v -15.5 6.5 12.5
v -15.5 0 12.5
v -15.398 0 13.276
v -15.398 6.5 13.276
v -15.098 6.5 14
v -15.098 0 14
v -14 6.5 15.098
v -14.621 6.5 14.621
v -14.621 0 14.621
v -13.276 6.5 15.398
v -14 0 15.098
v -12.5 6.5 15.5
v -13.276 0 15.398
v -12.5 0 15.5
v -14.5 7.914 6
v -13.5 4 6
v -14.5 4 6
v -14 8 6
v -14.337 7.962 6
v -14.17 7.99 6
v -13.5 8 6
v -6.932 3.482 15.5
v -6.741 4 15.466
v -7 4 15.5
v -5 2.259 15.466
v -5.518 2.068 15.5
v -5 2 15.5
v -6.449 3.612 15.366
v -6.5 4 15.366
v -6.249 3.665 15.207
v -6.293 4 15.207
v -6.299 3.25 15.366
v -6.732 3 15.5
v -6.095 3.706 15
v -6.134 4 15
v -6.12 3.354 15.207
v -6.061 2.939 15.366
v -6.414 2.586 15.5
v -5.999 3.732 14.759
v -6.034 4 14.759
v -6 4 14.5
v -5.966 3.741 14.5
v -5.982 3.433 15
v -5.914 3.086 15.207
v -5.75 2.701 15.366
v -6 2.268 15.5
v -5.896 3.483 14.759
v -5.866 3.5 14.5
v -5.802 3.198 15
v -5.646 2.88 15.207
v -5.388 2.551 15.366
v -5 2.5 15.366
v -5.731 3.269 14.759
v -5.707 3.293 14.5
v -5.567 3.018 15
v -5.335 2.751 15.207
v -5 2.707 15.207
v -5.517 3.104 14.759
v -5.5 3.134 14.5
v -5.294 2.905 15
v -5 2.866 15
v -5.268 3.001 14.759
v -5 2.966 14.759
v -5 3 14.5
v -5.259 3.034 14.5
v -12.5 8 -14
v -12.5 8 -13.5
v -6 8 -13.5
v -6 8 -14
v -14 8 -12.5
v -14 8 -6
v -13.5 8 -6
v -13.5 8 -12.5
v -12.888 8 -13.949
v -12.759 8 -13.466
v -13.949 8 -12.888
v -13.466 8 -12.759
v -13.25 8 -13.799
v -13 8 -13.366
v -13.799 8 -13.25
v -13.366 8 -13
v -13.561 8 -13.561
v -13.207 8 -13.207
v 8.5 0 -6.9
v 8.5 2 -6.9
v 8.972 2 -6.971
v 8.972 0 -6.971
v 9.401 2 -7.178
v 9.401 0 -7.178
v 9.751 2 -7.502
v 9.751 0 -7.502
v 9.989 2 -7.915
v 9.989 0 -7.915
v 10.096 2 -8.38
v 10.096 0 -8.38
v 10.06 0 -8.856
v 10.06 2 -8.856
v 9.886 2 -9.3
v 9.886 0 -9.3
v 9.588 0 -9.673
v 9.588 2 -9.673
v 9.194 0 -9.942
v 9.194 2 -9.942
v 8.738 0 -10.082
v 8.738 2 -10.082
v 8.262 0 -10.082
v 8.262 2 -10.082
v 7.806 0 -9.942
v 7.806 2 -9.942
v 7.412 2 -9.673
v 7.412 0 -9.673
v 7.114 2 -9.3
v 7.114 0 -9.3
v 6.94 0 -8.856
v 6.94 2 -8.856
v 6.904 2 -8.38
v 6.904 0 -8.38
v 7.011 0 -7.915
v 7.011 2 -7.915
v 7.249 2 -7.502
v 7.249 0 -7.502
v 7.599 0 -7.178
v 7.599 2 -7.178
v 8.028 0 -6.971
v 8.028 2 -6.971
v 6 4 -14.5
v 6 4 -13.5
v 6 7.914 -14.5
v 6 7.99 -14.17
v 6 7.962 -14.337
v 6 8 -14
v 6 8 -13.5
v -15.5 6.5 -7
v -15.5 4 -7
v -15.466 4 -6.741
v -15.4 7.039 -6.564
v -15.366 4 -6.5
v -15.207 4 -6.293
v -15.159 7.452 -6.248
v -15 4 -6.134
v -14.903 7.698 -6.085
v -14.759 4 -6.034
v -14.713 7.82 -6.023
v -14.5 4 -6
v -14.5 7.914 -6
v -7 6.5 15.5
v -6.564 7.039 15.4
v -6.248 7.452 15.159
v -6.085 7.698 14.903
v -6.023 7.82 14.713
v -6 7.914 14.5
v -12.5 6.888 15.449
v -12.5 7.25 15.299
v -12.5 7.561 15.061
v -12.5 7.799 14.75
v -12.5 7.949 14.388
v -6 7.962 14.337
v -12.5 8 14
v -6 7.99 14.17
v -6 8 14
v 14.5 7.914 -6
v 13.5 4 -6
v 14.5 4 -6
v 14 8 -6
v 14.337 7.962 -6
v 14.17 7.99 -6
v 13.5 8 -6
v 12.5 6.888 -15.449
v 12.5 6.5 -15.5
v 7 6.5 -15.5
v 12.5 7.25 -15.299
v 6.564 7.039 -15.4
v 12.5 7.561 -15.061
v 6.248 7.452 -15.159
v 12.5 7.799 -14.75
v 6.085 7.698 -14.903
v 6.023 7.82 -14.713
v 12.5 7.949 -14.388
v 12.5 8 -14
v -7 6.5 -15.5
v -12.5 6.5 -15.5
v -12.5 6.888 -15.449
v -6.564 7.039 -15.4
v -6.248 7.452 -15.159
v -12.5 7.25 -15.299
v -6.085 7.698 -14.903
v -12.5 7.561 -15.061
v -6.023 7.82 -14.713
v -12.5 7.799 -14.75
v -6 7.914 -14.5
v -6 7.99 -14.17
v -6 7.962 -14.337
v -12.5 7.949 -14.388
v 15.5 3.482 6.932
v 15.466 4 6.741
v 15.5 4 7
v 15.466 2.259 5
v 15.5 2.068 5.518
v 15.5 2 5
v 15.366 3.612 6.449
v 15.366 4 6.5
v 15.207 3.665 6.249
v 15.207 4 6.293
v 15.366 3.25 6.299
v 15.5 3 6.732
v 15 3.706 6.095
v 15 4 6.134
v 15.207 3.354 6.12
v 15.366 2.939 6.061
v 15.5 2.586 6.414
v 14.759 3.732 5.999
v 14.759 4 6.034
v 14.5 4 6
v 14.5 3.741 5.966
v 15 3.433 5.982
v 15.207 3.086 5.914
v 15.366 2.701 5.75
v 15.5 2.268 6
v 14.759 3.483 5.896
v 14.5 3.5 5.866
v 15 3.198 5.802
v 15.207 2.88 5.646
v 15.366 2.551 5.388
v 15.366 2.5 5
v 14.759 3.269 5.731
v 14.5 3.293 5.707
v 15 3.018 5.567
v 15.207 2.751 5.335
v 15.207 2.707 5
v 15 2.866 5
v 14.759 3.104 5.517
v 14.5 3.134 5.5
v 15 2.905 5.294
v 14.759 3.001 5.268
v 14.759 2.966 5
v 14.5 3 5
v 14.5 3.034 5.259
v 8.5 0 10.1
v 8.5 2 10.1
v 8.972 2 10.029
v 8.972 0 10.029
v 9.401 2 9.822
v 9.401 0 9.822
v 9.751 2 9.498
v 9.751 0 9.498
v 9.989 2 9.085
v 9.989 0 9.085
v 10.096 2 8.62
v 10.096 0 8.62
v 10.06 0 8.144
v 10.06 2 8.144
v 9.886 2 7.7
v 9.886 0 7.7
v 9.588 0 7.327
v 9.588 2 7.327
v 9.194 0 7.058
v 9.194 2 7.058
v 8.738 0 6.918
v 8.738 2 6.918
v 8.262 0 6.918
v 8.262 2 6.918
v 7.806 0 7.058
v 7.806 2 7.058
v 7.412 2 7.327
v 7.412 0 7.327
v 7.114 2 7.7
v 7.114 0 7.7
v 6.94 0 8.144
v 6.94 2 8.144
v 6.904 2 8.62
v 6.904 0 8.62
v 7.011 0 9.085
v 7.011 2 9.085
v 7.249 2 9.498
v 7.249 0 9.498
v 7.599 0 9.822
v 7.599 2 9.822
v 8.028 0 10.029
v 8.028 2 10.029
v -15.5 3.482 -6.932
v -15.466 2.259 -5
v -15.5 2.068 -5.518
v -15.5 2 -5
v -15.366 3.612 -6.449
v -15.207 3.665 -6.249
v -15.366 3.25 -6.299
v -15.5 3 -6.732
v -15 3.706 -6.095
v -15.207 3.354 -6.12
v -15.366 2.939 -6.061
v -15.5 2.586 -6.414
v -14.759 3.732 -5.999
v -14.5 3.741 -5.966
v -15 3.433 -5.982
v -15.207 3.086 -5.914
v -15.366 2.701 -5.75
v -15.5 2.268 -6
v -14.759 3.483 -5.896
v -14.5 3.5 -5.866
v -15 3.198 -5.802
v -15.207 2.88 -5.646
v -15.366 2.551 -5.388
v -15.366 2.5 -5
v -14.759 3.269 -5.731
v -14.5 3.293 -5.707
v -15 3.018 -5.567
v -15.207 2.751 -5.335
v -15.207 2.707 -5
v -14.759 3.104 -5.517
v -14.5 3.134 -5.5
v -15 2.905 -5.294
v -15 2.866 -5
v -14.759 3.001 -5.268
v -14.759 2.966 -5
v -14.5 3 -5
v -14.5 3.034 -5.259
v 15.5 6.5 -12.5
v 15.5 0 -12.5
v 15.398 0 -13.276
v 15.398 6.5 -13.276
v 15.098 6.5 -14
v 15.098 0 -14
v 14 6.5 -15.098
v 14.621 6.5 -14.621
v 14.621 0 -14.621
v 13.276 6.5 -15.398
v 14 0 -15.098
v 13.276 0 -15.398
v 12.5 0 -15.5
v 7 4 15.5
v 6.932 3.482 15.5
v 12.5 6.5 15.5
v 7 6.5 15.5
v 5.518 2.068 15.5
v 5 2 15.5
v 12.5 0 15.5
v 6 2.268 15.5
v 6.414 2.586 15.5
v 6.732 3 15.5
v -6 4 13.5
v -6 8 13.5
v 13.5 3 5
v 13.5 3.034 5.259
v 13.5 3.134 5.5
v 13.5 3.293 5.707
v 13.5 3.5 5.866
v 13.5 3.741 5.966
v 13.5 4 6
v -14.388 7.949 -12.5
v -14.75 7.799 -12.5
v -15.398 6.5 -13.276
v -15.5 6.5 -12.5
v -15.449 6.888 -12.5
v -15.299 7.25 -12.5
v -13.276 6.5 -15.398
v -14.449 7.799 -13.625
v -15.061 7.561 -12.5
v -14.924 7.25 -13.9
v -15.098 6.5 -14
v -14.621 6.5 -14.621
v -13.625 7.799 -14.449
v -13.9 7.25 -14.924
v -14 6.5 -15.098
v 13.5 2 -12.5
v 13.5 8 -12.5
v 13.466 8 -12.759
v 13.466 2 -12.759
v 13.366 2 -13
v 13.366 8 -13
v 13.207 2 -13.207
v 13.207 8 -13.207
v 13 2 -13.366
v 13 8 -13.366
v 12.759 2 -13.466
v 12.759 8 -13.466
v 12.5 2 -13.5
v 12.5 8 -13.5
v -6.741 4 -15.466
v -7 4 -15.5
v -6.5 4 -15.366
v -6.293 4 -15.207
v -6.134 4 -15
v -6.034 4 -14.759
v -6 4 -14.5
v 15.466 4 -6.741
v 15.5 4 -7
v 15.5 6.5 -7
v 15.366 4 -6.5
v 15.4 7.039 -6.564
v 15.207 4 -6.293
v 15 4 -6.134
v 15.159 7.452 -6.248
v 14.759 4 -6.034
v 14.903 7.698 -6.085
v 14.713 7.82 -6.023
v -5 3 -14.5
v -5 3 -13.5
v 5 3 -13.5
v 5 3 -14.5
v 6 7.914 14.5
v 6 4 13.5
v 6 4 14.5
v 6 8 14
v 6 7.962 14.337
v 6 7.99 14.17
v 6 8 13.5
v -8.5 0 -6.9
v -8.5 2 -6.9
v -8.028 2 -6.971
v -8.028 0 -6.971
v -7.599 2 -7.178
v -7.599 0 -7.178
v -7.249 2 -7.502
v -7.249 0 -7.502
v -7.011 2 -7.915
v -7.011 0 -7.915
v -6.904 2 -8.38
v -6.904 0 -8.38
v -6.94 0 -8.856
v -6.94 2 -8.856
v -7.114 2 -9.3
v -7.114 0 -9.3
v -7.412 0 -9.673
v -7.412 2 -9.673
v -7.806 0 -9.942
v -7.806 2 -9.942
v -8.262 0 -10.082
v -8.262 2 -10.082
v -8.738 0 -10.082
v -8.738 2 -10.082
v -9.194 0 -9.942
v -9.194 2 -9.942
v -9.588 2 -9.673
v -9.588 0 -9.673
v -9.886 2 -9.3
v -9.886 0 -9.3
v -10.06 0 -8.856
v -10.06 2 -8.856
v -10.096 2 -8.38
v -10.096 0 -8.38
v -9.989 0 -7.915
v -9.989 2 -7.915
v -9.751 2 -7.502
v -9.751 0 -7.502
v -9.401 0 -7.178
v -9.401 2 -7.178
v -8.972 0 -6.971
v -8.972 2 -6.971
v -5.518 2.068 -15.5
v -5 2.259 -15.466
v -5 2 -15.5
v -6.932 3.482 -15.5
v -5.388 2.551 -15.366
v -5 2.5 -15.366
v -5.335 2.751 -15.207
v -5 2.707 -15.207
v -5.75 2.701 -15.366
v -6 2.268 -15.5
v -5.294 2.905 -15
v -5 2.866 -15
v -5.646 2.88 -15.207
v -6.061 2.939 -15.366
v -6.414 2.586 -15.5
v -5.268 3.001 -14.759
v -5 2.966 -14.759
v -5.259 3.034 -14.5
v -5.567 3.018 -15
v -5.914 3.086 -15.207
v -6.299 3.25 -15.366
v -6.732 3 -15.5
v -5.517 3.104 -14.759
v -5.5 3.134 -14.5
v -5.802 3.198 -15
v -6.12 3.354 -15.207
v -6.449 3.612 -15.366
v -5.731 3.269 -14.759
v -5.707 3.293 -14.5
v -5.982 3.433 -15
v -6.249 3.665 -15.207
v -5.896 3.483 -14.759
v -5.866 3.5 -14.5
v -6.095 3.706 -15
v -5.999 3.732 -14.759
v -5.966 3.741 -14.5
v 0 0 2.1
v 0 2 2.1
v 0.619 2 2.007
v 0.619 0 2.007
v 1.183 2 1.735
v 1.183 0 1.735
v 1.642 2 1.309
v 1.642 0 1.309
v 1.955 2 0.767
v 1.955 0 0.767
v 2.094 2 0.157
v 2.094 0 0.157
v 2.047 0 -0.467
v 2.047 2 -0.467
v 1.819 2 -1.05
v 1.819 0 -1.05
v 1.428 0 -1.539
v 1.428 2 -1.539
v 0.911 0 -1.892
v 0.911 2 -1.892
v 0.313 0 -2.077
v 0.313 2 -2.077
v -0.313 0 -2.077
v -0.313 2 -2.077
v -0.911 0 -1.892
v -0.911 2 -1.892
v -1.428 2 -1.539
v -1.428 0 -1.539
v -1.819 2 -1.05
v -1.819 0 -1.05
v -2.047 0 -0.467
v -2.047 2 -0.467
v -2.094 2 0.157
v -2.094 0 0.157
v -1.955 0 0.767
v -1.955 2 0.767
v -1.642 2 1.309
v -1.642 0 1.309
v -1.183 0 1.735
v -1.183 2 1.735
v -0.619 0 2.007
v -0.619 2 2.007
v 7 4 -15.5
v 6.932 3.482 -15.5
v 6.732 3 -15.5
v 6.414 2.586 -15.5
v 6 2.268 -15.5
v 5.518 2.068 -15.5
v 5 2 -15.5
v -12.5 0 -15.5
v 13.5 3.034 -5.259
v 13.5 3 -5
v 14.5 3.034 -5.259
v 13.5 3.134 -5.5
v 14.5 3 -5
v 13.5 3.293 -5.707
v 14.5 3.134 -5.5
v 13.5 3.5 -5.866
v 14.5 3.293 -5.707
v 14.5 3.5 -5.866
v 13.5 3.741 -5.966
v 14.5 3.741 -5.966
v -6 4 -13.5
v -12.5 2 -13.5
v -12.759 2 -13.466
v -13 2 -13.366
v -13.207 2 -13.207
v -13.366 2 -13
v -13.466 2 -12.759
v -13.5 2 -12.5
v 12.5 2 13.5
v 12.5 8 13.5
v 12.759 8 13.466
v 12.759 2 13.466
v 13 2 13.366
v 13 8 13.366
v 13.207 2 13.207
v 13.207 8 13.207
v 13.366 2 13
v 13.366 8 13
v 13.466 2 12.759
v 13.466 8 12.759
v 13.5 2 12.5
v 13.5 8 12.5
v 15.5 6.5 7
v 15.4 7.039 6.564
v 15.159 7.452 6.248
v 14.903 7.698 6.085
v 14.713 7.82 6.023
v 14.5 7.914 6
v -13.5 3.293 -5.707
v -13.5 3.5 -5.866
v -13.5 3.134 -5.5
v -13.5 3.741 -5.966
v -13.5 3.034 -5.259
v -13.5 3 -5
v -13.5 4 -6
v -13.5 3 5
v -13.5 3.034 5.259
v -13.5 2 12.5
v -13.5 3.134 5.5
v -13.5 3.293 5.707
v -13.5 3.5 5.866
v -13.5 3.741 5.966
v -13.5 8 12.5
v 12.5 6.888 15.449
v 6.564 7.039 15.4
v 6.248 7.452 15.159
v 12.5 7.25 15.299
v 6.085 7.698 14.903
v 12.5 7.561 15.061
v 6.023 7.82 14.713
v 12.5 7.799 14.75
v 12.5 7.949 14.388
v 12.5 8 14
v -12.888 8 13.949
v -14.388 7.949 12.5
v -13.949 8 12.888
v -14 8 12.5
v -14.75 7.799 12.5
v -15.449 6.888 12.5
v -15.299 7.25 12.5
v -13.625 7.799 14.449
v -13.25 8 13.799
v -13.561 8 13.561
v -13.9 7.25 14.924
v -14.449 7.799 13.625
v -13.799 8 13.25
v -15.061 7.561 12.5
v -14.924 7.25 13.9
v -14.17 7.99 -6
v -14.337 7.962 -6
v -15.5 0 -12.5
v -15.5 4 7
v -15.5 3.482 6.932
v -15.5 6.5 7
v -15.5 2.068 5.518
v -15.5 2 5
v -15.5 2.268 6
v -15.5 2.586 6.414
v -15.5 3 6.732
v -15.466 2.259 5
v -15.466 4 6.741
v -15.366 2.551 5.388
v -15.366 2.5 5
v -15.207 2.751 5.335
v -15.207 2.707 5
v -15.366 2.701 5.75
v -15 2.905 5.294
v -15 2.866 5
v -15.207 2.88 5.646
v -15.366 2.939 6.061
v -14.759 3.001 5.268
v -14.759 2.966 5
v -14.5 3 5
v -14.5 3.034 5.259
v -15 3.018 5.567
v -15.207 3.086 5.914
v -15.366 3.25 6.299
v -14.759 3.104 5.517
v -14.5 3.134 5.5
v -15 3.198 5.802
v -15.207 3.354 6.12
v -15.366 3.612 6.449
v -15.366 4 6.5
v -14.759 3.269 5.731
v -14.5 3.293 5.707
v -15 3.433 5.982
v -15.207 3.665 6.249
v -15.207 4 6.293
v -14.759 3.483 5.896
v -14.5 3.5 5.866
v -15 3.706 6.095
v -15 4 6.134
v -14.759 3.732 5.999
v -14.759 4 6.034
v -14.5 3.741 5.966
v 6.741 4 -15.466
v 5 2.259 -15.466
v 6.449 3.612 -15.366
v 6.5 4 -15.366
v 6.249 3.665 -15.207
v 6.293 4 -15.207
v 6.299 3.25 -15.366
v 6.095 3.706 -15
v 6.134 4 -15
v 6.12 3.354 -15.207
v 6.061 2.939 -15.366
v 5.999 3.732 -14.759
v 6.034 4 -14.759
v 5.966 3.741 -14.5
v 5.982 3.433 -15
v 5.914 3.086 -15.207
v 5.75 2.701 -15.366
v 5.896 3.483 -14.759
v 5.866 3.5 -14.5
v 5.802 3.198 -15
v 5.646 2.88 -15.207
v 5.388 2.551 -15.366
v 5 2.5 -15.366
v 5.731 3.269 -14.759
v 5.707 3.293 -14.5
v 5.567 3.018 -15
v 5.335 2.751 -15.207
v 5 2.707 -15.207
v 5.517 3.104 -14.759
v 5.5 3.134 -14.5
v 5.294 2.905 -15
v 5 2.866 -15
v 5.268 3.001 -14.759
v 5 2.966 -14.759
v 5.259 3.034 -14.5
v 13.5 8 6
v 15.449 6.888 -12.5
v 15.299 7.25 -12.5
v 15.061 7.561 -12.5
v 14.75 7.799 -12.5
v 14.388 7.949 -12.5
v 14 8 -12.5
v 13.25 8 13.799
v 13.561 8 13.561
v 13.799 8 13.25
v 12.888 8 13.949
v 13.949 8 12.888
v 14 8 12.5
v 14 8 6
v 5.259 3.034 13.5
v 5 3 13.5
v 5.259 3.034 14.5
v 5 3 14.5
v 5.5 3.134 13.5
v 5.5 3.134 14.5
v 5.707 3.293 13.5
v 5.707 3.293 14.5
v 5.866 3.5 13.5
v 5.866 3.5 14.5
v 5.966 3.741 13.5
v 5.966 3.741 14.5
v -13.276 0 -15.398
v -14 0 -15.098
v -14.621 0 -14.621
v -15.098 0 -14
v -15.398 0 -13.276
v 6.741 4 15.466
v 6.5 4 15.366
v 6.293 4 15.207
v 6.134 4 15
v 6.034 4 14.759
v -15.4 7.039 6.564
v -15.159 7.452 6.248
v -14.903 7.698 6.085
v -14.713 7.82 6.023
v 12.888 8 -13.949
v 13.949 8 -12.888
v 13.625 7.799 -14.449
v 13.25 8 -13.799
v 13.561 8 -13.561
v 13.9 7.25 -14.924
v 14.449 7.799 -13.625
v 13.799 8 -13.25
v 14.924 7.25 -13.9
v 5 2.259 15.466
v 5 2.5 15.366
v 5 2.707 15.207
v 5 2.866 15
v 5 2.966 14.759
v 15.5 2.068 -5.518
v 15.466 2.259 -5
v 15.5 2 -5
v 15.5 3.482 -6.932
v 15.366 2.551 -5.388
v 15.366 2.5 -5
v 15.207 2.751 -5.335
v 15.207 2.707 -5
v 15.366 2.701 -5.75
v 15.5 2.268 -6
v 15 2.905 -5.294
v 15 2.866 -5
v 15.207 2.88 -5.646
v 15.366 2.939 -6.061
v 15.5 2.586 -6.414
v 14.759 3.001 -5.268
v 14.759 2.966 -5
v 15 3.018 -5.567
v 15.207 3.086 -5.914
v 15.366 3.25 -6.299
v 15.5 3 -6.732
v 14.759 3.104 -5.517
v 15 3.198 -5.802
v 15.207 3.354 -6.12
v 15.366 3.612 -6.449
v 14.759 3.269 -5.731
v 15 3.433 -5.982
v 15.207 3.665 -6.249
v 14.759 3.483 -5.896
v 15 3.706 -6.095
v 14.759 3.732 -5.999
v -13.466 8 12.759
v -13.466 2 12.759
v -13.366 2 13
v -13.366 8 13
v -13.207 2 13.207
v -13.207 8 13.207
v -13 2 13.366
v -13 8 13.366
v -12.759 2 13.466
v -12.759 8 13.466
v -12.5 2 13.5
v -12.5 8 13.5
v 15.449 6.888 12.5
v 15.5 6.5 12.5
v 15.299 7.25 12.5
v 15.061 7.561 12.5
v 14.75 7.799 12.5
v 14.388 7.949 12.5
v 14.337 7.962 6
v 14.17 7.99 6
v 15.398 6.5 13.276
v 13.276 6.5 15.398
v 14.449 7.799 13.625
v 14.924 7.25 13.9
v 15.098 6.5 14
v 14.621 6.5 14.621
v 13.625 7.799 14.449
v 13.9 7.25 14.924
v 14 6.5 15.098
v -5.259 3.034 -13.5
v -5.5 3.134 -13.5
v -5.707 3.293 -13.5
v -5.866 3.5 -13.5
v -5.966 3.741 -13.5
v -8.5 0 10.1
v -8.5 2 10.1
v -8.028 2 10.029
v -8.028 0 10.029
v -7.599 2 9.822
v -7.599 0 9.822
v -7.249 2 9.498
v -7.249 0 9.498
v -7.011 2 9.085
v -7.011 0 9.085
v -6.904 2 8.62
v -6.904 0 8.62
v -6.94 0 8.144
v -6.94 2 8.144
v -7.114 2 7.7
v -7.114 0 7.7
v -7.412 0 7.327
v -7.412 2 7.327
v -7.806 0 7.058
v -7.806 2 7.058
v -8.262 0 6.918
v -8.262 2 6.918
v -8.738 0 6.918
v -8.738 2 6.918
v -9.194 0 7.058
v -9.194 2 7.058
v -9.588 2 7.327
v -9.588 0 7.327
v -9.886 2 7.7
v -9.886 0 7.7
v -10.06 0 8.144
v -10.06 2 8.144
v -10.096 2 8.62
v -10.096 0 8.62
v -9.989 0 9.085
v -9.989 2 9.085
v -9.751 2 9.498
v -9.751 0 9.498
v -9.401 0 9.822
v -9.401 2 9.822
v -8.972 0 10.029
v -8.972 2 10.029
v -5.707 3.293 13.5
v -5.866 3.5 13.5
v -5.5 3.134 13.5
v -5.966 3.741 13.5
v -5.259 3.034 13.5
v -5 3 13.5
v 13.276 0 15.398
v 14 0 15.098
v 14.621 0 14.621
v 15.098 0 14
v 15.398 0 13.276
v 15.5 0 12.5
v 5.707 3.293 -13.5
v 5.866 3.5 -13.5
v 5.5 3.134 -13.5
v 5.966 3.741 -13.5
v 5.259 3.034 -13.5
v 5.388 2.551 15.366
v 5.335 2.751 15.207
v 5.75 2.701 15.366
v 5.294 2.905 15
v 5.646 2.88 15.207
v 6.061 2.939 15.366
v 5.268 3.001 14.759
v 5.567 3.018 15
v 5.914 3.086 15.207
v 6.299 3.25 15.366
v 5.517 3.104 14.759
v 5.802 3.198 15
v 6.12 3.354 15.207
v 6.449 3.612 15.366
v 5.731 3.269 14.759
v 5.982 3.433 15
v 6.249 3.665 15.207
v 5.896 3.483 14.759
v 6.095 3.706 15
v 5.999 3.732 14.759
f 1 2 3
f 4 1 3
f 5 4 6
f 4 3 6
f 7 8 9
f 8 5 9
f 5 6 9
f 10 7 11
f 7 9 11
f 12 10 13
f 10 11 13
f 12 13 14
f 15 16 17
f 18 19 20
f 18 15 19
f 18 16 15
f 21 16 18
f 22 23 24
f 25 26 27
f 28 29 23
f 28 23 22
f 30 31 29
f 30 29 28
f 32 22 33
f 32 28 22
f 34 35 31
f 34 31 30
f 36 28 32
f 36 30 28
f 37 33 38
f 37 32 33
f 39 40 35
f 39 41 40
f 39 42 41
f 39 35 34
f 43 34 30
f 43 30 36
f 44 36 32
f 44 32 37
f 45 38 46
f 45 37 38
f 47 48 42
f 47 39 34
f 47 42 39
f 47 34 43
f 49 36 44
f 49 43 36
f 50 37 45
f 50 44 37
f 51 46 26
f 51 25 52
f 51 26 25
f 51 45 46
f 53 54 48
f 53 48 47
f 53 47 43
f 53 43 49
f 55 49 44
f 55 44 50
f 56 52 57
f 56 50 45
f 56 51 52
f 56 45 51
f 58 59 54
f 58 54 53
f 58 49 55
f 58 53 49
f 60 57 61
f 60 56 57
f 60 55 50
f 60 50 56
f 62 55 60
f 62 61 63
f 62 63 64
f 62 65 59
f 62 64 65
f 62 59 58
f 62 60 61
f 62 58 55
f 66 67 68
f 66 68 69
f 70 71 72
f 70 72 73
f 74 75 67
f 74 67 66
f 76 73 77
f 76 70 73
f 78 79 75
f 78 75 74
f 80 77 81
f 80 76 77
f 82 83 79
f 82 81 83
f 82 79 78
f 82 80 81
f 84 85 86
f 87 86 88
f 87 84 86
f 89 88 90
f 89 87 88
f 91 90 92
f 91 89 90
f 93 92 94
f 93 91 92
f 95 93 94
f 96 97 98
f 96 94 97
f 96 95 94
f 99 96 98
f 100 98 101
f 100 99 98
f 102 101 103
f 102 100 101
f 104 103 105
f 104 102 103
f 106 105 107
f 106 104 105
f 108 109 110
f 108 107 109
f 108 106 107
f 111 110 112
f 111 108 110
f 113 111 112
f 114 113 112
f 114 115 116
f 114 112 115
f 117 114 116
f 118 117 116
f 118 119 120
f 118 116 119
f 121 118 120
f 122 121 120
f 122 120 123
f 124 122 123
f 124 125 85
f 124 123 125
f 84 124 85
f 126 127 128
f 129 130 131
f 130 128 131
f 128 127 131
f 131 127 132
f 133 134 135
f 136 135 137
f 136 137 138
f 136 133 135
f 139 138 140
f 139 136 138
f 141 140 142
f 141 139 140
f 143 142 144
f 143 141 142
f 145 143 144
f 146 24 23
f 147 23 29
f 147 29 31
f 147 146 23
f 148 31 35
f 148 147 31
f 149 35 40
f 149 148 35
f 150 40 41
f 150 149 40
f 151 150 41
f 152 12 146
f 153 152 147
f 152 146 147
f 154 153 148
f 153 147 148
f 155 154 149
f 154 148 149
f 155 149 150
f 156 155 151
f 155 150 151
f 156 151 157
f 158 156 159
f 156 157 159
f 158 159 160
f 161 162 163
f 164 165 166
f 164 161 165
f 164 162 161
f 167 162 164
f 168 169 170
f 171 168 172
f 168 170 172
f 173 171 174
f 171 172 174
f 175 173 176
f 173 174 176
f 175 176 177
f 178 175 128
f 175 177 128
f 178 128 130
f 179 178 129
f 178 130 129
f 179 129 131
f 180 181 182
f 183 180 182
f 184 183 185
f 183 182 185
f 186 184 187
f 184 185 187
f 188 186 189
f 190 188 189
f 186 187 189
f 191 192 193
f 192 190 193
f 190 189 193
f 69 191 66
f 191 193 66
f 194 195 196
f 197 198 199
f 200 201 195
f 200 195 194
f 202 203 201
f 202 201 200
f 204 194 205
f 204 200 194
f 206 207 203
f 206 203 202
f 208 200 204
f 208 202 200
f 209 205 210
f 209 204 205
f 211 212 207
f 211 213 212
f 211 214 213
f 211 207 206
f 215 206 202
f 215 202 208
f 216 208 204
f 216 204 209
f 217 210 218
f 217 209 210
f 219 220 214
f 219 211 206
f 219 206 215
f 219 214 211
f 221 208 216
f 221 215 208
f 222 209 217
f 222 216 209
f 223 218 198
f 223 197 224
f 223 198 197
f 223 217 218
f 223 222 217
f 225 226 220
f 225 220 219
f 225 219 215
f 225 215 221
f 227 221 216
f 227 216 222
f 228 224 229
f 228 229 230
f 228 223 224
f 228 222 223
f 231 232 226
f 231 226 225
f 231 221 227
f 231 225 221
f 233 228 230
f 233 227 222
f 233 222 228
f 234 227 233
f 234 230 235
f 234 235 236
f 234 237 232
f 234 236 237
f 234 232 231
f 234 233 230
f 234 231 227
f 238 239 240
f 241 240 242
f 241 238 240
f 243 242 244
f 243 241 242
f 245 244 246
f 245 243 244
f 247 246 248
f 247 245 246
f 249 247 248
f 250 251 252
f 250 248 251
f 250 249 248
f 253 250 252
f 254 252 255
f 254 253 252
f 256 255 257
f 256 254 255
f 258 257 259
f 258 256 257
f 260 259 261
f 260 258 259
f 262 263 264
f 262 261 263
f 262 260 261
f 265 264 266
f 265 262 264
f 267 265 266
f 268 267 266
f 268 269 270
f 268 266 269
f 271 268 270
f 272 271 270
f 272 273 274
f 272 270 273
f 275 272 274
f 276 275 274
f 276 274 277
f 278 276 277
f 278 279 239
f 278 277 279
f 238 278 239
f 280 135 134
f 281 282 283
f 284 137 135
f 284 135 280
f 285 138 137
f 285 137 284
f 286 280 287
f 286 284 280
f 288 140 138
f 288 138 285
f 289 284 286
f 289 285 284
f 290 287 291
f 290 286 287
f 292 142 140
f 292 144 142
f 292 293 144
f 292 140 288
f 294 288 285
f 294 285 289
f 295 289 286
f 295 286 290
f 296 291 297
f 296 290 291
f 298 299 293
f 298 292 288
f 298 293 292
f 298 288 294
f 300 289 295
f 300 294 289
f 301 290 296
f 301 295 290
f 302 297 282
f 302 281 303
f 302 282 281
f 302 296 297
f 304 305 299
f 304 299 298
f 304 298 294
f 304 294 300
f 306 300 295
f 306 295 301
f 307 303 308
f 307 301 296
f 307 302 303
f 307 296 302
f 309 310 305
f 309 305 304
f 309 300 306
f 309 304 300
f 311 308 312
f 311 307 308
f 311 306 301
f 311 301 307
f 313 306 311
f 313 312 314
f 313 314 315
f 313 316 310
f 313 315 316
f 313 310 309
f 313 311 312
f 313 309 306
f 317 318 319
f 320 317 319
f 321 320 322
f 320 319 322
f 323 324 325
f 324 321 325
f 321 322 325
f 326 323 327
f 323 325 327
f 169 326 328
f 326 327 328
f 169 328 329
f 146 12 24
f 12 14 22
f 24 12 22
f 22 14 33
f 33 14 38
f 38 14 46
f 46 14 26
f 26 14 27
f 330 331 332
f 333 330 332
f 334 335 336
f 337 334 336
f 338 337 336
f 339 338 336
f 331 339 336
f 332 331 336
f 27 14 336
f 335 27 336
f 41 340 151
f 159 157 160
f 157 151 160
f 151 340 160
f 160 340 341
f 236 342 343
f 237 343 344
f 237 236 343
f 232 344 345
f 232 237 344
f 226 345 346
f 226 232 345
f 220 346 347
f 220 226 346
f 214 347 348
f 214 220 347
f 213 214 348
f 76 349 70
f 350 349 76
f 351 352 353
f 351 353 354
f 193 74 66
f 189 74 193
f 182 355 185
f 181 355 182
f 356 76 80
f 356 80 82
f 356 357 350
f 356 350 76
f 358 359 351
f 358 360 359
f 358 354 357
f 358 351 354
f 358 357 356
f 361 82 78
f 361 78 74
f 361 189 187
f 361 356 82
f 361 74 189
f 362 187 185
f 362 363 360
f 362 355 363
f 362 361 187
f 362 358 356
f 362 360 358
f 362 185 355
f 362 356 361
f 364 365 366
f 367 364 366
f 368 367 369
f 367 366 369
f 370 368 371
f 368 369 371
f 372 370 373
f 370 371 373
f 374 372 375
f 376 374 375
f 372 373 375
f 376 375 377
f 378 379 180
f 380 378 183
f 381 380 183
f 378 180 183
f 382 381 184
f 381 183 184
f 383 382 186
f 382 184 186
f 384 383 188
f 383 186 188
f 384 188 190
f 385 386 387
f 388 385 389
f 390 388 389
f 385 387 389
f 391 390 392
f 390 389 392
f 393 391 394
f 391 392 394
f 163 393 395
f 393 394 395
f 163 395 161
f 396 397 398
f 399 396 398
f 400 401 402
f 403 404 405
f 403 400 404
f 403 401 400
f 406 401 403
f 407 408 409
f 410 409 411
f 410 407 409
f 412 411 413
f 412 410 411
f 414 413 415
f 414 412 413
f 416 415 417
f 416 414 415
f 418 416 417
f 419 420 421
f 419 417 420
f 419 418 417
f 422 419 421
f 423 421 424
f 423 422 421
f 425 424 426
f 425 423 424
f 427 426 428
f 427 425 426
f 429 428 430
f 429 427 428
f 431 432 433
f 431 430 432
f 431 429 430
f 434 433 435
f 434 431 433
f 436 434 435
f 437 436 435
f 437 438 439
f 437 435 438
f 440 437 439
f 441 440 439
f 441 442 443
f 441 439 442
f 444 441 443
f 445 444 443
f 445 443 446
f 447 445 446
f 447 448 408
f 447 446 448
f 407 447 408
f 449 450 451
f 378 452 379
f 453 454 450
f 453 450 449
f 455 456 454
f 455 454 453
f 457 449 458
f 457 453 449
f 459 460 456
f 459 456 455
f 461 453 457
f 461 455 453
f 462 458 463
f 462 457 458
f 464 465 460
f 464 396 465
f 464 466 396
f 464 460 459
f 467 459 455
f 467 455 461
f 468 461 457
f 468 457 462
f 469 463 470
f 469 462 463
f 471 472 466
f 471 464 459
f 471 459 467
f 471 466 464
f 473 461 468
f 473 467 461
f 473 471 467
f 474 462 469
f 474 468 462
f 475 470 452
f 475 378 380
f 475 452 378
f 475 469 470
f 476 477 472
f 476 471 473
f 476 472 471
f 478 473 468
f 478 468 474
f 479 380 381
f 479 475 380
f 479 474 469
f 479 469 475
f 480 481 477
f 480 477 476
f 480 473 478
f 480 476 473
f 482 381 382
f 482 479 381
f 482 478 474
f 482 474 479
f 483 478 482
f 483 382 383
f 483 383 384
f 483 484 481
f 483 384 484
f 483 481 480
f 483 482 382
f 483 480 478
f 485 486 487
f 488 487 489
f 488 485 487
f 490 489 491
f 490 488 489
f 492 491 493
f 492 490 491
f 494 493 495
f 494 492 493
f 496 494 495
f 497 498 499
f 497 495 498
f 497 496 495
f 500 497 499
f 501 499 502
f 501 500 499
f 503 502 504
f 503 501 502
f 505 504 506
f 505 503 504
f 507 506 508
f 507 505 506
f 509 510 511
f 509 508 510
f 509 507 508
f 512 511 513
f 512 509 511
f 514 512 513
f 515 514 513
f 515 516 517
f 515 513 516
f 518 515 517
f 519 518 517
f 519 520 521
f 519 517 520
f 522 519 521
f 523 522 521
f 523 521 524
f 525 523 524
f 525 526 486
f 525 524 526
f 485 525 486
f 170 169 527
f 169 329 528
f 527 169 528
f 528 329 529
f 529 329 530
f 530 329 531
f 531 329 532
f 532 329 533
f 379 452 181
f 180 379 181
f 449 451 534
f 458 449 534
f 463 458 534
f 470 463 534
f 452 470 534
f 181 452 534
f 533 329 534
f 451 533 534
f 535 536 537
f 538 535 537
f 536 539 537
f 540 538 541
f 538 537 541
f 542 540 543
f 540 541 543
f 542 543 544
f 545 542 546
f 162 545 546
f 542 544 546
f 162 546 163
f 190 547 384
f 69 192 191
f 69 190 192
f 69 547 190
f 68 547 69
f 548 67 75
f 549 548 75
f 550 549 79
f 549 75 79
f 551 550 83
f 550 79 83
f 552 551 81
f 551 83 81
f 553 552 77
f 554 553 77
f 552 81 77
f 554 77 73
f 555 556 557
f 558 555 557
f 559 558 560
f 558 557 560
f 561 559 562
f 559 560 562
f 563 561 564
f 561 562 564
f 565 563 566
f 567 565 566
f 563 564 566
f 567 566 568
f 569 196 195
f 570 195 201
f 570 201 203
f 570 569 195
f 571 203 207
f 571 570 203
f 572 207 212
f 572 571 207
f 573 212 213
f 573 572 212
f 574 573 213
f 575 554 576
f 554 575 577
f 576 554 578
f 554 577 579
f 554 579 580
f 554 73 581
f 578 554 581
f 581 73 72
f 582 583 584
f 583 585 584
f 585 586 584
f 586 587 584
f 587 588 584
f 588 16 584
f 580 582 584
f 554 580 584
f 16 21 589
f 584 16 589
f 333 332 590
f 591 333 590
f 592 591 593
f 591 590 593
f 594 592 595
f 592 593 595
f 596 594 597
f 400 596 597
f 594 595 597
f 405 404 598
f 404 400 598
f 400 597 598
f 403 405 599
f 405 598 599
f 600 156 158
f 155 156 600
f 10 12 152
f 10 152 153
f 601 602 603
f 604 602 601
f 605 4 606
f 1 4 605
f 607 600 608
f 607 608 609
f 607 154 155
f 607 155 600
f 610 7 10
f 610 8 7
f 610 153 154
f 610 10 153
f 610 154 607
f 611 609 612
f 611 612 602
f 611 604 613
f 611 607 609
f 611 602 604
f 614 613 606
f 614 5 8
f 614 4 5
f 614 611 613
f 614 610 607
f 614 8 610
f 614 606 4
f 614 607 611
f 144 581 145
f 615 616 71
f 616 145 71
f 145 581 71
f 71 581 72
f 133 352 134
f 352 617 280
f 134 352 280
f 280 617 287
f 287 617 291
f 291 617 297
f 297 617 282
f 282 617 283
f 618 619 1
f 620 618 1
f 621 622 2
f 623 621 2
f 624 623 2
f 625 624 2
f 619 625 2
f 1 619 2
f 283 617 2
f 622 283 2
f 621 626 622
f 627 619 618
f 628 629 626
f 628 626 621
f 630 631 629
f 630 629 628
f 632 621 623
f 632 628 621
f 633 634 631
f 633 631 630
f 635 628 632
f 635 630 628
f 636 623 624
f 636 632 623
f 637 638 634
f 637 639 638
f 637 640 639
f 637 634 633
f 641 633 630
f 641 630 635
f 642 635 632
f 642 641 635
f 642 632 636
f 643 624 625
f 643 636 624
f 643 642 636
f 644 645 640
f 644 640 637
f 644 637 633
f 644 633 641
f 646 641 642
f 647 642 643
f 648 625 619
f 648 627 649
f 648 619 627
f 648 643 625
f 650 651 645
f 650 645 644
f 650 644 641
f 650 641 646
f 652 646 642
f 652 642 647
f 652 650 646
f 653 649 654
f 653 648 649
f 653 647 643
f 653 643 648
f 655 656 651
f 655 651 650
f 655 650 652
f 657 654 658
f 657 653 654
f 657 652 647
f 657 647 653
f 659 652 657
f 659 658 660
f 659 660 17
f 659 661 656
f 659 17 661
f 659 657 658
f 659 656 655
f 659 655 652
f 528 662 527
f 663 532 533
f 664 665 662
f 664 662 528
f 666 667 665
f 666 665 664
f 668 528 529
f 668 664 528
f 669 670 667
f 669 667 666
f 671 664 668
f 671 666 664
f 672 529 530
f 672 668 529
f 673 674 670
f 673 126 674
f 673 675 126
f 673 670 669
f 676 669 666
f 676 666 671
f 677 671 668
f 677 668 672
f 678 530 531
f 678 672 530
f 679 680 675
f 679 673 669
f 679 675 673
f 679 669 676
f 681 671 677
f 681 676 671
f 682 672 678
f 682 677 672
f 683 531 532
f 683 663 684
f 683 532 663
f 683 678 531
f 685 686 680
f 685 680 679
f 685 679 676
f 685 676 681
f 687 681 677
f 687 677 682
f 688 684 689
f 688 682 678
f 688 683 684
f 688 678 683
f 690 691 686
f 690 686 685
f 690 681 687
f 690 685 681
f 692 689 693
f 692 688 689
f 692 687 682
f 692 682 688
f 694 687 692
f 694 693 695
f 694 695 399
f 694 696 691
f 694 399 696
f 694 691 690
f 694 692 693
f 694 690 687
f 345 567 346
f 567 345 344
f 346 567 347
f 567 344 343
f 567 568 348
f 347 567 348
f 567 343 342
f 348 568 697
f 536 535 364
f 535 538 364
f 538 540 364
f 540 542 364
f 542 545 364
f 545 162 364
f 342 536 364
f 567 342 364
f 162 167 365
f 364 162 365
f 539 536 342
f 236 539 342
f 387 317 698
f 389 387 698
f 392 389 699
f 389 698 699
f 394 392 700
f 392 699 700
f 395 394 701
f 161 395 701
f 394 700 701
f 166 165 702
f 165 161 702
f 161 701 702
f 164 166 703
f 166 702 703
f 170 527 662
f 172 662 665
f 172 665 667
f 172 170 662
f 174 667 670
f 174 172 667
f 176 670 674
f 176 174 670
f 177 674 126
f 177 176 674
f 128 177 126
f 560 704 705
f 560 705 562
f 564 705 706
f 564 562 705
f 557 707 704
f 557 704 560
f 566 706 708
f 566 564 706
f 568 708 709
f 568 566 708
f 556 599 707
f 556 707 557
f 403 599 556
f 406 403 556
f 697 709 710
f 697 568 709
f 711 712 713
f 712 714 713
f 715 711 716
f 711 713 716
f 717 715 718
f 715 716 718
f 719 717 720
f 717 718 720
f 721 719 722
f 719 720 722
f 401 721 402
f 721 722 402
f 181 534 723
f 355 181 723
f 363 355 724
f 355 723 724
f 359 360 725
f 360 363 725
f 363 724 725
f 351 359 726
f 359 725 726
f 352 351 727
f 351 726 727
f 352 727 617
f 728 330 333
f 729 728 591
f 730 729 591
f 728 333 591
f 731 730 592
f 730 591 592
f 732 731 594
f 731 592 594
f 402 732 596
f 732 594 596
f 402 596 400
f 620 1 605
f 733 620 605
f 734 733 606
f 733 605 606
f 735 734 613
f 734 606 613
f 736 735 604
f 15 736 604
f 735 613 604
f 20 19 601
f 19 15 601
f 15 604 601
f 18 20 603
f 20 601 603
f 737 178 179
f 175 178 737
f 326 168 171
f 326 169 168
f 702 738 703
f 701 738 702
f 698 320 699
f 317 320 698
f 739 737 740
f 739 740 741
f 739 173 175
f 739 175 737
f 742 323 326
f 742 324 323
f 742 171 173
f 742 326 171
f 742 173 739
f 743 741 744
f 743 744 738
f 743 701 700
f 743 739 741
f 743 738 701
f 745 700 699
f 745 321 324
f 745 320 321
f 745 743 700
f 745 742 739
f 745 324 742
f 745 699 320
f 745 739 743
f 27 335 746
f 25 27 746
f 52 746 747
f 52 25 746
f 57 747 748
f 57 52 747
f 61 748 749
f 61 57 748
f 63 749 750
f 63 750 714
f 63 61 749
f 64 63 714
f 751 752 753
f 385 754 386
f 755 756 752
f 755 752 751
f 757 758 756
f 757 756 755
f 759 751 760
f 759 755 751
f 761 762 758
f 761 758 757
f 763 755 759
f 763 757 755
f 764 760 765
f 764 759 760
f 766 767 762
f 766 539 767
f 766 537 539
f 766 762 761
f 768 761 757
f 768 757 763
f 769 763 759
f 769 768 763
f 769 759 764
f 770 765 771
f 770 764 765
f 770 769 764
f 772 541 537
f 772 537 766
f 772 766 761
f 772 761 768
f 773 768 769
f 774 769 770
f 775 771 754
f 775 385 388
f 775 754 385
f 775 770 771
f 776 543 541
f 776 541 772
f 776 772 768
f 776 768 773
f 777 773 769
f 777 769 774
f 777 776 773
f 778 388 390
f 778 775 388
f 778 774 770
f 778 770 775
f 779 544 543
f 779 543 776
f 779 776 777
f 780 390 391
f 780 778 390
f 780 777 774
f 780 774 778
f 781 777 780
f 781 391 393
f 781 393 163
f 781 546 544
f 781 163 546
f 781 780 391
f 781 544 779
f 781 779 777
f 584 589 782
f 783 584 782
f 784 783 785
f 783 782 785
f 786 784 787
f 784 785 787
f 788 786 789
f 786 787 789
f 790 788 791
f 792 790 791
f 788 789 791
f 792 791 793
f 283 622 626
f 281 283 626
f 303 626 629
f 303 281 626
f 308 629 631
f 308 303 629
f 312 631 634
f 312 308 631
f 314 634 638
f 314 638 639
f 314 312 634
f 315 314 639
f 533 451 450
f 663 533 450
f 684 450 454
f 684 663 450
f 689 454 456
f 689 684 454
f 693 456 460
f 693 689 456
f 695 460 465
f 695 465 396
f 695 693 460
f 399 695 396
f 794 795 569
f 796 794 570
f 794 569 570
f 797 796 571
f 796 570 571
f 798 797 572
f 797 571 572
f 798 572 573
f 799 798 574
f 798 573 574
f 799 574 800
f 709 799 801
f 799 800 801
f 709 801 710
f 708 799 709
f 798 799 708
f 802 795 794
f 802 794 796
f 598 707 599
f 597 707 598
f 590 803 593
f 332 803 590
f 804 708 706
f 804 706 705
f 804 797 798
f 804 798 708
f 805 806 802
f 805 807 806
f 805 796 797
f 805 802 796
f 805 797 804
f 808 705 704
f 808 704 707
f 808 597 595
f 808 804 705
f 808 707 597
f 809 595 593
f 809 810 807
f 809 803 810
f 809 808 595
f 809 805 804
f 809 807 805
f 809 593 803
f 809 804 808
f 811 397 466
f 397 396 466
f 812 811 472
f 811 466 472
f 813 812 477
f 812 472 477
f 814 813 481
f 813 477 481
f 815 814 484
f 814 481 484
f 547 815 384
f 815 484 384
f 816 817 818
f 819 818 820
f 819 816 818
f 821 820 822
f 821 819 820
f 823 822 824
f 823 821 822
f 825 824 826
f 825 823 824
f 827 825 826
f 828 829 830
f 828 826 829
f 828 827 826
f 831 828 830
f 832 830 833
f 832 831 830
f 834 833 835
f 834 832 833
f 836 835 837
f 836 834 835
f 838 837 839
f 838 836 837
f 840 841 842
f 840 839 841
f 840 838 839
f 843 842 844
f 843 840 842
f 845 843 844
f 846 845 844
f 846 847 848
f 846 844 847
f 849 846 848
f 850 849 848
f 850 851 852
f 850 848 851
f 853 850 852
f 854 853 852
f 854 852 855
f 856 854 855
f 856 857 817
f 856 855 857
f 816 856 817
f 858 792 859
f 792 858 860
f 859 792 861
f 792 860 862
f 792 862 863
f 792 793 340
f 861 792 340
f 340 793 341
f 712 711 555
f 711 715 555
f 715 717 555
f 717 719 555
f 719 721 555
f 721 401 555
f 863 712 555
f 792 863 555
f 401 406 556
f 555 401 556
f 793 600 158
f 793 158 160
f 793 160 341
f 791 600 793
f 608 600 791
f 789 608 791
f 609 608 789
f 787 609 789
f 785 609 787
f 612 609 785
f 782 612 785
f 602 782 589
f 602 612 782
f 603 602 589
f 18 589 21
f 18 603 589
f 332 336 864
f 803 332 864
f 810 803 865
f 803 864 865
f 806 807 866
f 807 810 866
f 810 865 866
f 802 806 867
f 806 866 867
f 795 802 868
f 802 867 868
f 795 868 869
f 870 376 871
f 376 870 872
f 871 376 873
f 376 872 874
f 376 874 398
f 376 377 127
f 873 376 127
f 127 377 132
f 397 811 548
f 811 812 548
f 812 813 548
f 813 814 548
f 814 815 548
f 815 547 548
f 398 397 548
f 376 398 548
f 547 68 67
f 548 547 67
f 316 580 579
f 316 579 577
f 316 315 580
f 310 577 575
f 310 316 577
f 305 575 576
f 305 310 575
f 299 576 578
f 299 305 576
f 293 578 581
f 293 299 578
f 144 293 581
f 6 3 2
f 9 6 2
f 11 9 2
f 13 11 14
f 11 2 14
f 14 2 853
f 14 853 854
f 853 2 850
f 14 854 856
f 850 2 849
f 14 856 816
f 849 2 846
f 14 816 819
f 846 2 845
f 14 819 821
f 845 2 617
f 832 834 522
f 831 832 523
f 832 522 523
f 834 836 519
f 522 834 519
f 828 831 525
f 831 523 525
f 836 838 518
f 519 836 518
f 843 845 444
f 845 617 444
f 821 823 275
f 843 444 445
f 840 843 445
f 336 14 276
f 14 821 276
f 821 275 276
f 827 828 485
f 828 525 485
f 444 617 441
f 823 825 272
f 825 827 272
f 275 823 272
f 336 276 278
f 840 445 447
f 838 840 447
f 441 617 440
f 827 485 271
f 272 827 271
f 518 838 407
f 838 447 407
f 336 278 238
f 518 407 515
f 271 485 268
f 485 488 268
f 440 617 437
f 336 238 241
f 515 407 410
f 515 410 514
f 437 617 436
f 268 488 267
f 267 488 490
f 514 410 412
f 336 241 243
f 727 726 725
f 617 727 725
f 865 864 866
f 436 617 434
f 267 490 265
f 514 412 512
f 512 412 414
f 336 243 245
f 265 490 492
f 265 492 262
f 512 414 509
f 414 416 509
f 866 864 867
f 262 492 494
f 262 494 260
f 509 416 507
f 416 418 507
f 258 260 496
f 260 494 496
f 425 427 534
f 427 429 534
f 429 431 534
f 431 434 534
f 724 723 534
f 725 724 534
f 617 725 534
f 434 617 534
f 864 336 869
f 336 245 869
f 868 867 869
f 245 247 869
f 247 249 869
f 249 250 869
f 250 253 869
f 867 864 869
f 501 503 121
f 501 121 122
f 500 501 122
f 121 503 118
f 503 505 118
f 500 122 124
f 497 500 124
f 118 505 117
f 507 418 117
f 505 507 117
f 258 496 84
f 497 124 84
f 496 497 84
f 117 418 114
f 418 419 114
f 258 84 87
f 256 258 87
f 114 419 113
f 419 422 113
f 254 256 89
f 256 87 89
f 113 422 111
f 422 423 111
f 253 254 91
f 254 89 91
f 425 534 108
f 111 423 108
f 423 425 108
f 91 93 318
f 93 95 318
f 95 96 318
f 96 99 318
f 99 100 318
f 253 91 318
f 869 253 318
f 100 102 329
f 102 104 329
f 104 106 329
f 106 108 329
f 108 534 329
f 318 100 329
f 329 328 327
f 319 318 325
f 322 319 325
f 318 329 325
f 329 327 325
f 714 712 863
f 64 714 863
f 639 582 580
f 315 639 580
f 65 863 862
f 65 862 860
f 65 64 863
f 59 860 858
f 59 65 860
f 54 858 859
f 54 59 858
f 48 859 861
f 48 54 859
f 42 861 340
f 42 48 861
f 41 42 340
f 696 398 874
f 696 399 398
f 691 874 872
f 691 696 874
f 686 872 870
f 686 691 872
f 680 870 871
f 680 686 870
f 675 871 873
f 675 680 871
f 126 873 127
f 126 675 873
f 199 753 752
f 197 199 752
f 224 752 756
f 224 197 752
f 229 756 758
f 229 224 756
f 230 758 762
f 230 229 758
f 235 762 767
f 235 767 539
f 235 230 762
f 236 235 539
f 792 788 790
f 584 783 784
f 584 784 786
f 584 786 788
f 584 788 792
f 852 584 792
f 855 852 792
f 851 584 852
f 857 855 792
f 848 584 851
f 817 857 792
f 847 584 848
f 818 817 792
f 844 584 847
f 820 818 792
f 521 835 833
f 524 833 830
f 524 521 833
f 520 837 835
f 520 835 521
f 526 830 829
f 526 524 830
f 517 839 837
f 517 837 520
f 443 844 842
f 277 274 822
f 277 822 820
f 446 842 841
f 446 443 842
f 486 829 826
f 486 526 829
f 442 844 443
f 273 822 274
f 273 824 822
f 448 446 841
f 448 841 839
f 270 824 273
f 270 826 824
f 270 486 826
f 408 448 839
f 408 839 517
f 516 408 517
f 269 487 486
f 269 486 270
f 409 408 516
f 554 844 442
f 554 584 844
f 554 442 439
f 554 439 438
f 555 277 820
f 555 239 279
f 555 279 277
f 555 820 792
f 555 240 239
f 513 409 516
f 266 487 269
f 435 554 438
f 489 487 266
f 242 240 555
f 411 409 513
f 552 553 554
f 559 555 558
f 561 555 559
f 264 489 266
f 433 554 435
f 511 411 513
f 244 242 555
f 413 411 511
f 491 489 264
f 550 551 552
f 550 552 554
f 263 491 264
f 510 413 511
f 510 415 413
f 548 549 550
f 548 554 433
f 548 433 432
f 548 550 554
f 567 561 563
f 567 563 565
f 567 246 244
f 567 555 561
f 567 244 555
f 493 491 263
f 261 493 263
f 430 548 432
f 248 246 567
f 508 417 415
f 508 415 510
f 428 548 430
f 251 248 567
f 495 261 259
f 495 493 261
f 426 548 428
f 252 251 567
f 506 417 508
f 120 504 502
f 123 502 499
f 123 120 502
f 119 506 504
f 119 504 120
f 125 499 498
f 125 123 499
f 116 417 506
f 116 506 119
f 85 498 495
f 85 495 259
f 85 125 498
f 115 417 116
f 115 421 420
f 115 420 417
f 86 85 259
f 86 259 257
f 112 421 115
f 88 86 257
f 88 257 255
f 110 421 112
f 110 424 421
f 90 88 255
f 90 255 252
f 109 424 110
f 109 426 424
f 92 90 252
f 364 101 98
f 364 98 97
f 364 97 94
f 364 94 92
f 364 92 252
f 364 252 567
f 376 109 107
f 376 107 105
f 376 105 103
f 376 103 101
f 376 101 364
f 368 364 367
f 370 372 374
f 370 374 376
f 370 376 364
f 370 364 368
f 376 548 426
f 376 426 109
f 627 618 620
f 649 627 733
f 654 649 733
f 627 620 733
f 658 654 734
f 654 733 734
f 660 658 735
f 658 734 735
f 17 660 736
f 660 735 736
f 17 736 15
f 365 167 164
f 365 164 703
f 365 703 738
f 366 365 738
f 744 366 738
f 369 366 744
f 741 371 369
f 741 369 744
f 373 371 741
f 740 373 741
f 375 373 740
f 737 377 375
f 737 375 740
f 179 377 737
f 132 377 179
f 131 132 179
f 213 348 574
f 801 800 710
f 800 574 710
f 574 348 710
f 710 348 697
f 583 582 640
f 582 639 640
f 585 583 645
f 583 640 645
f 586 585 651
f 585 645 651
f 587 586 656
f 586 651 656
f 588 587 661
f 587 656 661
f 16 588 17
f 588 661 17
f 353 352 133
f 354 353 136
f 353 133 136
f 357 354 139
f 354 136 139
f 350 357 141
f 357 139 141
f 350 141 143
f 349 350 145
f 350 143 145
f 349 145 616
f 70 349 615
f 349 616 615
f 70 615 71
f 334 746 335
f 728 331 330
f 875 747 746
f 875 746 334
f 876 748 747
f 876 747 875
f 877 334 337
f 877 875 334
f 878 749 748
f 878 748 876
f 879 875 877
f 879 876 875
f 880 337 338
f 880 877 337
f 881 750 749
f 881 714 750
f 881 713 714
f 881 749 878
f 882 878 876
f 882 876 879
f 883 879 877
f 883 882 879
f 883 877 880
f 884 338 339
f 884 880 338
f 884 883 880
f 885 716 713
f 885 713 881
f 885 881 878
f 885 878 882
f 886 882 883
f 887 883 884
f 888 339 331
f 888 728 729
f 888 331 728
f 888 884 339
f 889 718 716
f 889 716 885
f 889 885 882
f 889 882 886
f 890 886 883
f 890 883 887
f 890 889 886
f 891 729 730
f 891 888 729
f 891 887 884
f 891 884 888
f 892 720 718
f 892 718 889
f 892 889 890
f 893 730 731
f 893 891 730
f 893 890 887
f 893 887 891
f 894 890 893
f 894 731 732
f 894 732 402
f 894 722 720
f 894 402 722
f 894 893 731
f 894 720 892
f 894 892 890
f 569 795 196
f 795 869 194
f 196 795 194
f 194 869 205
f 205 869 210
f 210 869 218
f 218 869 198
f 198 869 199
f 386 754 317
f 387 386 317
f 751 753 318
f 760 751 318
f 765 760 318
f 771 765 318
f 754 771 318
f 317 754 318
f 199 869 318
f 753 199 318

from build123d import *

# Parameters (mm, degrees)
SKETCH1_R               = 2.1
SKETCH1_R_2             = 1.6
BOSS_EXTRUDE1_DEPTH     = 10
CUT_EXTRUDE1_DEPTH      = 8
SKETCH3_W               = 12
SKETCH3_H               = 6
CUT_EXTRUDE2_DEPTH      = 35.369317712
CIRPATTERN1_COUNT       = 4
FILLET1_R               = 1
CUT_EXTRUDE3_DEPTH      = 25.093567606
CUT_EXTRUDE3_DEPTH_BACK = 25.093567606
SKETCH4_W               = 64.927368138
SKETCH4_H               = 2
FILLET2_R               = 1.5


# Some blends are built 0.0001 mm under size
with BuildPart() as part:
    # Sketch1 → Boss-Extrude1 (new body)
    with BuildSketch(Plane(origin=(0, 0, 0), x_dir=(1, 0, 0), z_dir=(0, 1, 0))):
        with BuildLine():
            Line((-12.5, -15.5), (12.5, -15.5))
            ThreePointArc((12.5, -15.5), (14.621320344, -14.621320344), (15.5, -12.5))
            Line((15.5, -12.5), (15.5, 12.5))
            ThreePointArc((15.5, 12.5), (14.621320344, 14.621320344), (12.5, 15.5))
            Line((12.5, 15.5), (-12.5, 15.5))
            ThreePointArc((-12.5, 15.5), (-14.621320344, 14.621320344), (-15.5, 12.5))
            Line((-15.5, 12.5), (-15.5, -12.5))
            ThreePointArc((-15.5, -12.5), (-14.621320344, -14.621320344), (-12.5, -15.5))
        make_face()
        with Locations(Location((0, 0, 0), (0, 0, 270))):
            Circle(SKETCH1_R, mode=Mode.SUBTRACT)
        with Locations(Location((-8.5, 8.5, 0), (0, 0, 270))):
            Circle(SKETCH1_R_2, mode=Mode.SUBTRACT)
        with Locations(Location((8.5, 8.5, 0), (0, 0, 270))):
            Circle(SKETCH1_R_2, mode=Mode.SUBTRACT)
        with Locations(Location((8.5, -8.5, 0), (0, 0, 270))):
            Circle(SKETCH1_R_2, mode=Mode.SUBTRACT)
        with Locations(Location((-8.5, -8.5, 0), (0, 0, 270))):
            Circle(SKETCH1_R_2, mode=Mode.SUBTRACT)
    extrude(amount=BOSS_EXTRUDE1_DEPTH)

    # Sketch2 → Cut-Extrude1 (cut)
    with BuildSketch(Plane(origin=(0, 10, 0), x_dir=(1, 0, 0), z_dir=(0, 1, 0))):
        with BuildLine():
            Line((-12.5, -13.5), (12.5, -13.5))
            ThreePointArc((12.5, -13.5), (13.207106781, -13.207106781), (13.5, -12.5))
            Line((13.5, -12.5), (13.5, 12.5))
            ThreePointArc((13.5, 12.5), (13.207106781, 13.207106781), (12.5, 13.5))
            Line((12.5, 13.5), (-12.5, 13.5))
            ThreePointArc((-12.5, 13.5), (-13.207106781, 13.207106781), (-13.5, 12.5))
            Line((-13.5, 12.5), (-13.5, -12.5))
            ThreePointArc((-13.5, -12.5), (-13.207106781, -13.207106781), (-12.5, -13.5))
        make_face()
    extrude(amount=-CUT_EXTRUDE1_DEPTH, mode=Mode.SUBTRACT)

    # Sketch3 → Cut-Extrude2 (cut, through all)
    with BuildSketch(Plane.XY.offset(-13.5)):
        with Locations((0, 6)):
            Rectangle(SKETCH3_W, SKETCH3_H)
    cut_extrude2 = extrude(amount=-CUT_EXTRUDE2_DEPTH, mode=Mode.SUBTRACT)

    # CirPattern1: Cut-Extrude2 ×4 about axis
    cirpattern1_axis = Axis((0, 0, 0), (0, 1, 0))
    for i in range(1, CIRPATTERN1_COUNT):
        add(cut_extrude2.rotate(cirpattern1_axis, i * 360 / CIRPATTERN1_COUNT), mode=Mode.SUBTRACT)

    # Fillet1
    fillet1_edges = [part.edges().sort_by_distance(p)[0] for p in [
        (-15.5, 6, 6),
        (-14.5, 3, 6),
        (-15.5, 9, 0),
        (-14.5, 9, 6),
        (-15.5, 6, -6),
        (-14.5, 9, -6),
        (-15.5, 3, 0),
        (-14.5, 3, -6),
        (6, 6, 15.5),
        (6, 3, 14.5),
        (0, 9, 15.5),
        (6, 9, 14.5),
        (-6, 6, 15.5),
        (-6, 9, 14.5),
        (0, 3, 15.5),
        (-6, 3, 14.5),
        (15.5, 6, -6),
        (14.5, 3, -6),
        (15.5, 9, 0),
        (14.5, 9, -6),
        (15.5, 6, 6),
        (14.5, 9, 6),
        (15.5, 3, 0),
        (14.5, 3, 6),
        (-6, 6, -15.5),
        (-6, 3, -14.5),
        (0, 9, -15.5),
        (-6, 9, -14.5),
        (6, 6, -15.5),
        (6, 9, -14.5),
        (0, 3, -15.5),
        (6, 3, -14.5),
    ]]
    fillet(fillet1_edges, radius=FILLET1_R - 0.0001)  # a hair under: the kernel refuses the full size

    # Sketch4 → Cut-Extrude3 (cut, two sides: drawn at the far end of the back side and taken through both)
    with BuildSketch(Plane(origin=(0, 0, 0), x_dir=(0, 0, -1), z_dir=(1, 0, 0)).offset(-CUT_EXTRUDE3_DEPTH_BACK)):
        with Locations((2.454919732, 9)):
            Rectangle(SKETCH4_W, SKETCH4_H)
    extrude(amount=CUT_EXTRUDE3_DEPTH + CUT_EXTRUDE3_DEPTH_BACK, mode=Mode.SUBTRACT)

    # Fillet2
    # the kernel refuses this fillet: 1.5 mm, written as the material it takes off along each edge
    with BuildSketch(Plane(origin=(12.5, 8, -12.5), x_dir=(0, 0, -1), z_dir=(-1, 0, 0))) as fillet2_piece_1:
        with BuildLine():
            CenterArc((3 - FILLET2_R, FILLET2_R), FILLET2_R, 270, 90)
            Line((3 - FILLET2_R, 0), (3, 0))
            Line((3, 0), (3, FILLET2_R))
        make_face()
    revolve(axis=Axis((12.5, 8, -12.5), (0, -1, 0)), revolution_arc=90, mode=Mode.SUBTRACT)
    with BuildSketch(Plane(origin=(3.2499, 8, -15.5), x_dir=(0, -1, 0), z_dir=(1, 0, 0)), Plane(origin=(15.5, 8, -12.5), x_dir=(0, -1, 0), z_dir=(0, 0, 1)), Plane(origin=(15.5, 8, 3.2499), x_dir=(0, -1, 0), z_dir=(0, 0, 1)), Plane(origin=(12.5, 8, 15.5), x_dir=(0, -1, 0), z_dir=(-1, 0, 0)), Plane(origin=(-15.5, 8, 12.5), x_dir=(0, -1, 0), z_dir=(0, 0, -1)), Plane(origin=(-15.5, 8, -3.2499), x_dir=(0, -1, 0), z_dir=(0, 0, -1))) as fillet2_piece_2:
        with BuildLine():
            CenterArc((FILLET2_R, -FILLET2_R), FILLET2_R, 90, 90)
            Line((0, -FILLET2_R), (0, 0))
            Line((0, 0), (FILLET2_R, 0))
        make_face()
    extrude(amount=9.2501, mode=Mode.SUBTRACT)
    with BuildSketch(Plane(origin=(12.5, 8, 12.5), x_dir=(1, 0, 0), z_dir=(0, 0, -1))) as fillet2_piece_3:
        with BuildLine():
            CenterArc((3 - FILLET2_R, FILLET2_R), FILLET2_R, 270, 90)
            Line((3 - FILLET2_R, 0), (3, 0))
            Line((3, 0), (3, FILLET2_R))
        make_face()
    revolve(axis=Axis((12.5, 8, 12.5), (0, -1, 0)), revolution_arc=90, mode=Mode.SUBTRACT)
    with BuildSketch(Plane(origin=(-3.2499, 8, 15.5), x_dir=(0, 0, -1), z_dir=(-1, 0, 0)), Plane(origin=(-12.5, 8, -15.5), x_dir=(0, 0, 1), z_dir=(1, 0, 0))) as fillet2_piece_4:
        with BuildLine():
            CenterArc((FILLET2_R, FILLET2_R), FILLET2_R, 180, 90)
            Line((0, FILLET2_R), (0, 0))
            Line((0, 0), (FILLET2_R, 0))
        make_face()
    extrude(amount=9.2501, mode=Mode.SUBTRACT)
    with BuildSketch(Plane(origin=(-12.5, 8, 12.5), x_dir=(0, 0, 1), z_dir=(1, 0, 0))) as fillet2_piece_5:
        with BuildLine():
            CenterArc((3 - FILLET2_R, FILLET2_R), FILLET2_R, 270, 90)
            Line((3 - FILLET2_R, 0), (3, 0))
            Line((3, 0), (3, FILLET2_R))
        make_face()
    revolve(axis=Axis((-12.5, 8, 12.5), (0, -1, 0)), revolution_arc=90, mode=Mode.SUBTRACT)
    with BuildSketch(Plane(origin=(-12.5, 8, -12.5), x_dir=(-1, 0, 0), z_dir=(0, 0, 1))) as fillet2_piece_6:
        with BuildLine():
            CenterArc((3 - FILLET2_R, FILLET2_R), FILLET2_R, 270, 90)
            Line((3, FILLET2_R), (3, 0))
            Line((3, 0), (3 - FILLET2_R, 0))
        make_face()
    revolve(axis=Axis((-12.5, 8, -12.5), (0, -1, 0)), revolution_arc=90, mode=Mode.SUBTRACT)


solid = part.part
